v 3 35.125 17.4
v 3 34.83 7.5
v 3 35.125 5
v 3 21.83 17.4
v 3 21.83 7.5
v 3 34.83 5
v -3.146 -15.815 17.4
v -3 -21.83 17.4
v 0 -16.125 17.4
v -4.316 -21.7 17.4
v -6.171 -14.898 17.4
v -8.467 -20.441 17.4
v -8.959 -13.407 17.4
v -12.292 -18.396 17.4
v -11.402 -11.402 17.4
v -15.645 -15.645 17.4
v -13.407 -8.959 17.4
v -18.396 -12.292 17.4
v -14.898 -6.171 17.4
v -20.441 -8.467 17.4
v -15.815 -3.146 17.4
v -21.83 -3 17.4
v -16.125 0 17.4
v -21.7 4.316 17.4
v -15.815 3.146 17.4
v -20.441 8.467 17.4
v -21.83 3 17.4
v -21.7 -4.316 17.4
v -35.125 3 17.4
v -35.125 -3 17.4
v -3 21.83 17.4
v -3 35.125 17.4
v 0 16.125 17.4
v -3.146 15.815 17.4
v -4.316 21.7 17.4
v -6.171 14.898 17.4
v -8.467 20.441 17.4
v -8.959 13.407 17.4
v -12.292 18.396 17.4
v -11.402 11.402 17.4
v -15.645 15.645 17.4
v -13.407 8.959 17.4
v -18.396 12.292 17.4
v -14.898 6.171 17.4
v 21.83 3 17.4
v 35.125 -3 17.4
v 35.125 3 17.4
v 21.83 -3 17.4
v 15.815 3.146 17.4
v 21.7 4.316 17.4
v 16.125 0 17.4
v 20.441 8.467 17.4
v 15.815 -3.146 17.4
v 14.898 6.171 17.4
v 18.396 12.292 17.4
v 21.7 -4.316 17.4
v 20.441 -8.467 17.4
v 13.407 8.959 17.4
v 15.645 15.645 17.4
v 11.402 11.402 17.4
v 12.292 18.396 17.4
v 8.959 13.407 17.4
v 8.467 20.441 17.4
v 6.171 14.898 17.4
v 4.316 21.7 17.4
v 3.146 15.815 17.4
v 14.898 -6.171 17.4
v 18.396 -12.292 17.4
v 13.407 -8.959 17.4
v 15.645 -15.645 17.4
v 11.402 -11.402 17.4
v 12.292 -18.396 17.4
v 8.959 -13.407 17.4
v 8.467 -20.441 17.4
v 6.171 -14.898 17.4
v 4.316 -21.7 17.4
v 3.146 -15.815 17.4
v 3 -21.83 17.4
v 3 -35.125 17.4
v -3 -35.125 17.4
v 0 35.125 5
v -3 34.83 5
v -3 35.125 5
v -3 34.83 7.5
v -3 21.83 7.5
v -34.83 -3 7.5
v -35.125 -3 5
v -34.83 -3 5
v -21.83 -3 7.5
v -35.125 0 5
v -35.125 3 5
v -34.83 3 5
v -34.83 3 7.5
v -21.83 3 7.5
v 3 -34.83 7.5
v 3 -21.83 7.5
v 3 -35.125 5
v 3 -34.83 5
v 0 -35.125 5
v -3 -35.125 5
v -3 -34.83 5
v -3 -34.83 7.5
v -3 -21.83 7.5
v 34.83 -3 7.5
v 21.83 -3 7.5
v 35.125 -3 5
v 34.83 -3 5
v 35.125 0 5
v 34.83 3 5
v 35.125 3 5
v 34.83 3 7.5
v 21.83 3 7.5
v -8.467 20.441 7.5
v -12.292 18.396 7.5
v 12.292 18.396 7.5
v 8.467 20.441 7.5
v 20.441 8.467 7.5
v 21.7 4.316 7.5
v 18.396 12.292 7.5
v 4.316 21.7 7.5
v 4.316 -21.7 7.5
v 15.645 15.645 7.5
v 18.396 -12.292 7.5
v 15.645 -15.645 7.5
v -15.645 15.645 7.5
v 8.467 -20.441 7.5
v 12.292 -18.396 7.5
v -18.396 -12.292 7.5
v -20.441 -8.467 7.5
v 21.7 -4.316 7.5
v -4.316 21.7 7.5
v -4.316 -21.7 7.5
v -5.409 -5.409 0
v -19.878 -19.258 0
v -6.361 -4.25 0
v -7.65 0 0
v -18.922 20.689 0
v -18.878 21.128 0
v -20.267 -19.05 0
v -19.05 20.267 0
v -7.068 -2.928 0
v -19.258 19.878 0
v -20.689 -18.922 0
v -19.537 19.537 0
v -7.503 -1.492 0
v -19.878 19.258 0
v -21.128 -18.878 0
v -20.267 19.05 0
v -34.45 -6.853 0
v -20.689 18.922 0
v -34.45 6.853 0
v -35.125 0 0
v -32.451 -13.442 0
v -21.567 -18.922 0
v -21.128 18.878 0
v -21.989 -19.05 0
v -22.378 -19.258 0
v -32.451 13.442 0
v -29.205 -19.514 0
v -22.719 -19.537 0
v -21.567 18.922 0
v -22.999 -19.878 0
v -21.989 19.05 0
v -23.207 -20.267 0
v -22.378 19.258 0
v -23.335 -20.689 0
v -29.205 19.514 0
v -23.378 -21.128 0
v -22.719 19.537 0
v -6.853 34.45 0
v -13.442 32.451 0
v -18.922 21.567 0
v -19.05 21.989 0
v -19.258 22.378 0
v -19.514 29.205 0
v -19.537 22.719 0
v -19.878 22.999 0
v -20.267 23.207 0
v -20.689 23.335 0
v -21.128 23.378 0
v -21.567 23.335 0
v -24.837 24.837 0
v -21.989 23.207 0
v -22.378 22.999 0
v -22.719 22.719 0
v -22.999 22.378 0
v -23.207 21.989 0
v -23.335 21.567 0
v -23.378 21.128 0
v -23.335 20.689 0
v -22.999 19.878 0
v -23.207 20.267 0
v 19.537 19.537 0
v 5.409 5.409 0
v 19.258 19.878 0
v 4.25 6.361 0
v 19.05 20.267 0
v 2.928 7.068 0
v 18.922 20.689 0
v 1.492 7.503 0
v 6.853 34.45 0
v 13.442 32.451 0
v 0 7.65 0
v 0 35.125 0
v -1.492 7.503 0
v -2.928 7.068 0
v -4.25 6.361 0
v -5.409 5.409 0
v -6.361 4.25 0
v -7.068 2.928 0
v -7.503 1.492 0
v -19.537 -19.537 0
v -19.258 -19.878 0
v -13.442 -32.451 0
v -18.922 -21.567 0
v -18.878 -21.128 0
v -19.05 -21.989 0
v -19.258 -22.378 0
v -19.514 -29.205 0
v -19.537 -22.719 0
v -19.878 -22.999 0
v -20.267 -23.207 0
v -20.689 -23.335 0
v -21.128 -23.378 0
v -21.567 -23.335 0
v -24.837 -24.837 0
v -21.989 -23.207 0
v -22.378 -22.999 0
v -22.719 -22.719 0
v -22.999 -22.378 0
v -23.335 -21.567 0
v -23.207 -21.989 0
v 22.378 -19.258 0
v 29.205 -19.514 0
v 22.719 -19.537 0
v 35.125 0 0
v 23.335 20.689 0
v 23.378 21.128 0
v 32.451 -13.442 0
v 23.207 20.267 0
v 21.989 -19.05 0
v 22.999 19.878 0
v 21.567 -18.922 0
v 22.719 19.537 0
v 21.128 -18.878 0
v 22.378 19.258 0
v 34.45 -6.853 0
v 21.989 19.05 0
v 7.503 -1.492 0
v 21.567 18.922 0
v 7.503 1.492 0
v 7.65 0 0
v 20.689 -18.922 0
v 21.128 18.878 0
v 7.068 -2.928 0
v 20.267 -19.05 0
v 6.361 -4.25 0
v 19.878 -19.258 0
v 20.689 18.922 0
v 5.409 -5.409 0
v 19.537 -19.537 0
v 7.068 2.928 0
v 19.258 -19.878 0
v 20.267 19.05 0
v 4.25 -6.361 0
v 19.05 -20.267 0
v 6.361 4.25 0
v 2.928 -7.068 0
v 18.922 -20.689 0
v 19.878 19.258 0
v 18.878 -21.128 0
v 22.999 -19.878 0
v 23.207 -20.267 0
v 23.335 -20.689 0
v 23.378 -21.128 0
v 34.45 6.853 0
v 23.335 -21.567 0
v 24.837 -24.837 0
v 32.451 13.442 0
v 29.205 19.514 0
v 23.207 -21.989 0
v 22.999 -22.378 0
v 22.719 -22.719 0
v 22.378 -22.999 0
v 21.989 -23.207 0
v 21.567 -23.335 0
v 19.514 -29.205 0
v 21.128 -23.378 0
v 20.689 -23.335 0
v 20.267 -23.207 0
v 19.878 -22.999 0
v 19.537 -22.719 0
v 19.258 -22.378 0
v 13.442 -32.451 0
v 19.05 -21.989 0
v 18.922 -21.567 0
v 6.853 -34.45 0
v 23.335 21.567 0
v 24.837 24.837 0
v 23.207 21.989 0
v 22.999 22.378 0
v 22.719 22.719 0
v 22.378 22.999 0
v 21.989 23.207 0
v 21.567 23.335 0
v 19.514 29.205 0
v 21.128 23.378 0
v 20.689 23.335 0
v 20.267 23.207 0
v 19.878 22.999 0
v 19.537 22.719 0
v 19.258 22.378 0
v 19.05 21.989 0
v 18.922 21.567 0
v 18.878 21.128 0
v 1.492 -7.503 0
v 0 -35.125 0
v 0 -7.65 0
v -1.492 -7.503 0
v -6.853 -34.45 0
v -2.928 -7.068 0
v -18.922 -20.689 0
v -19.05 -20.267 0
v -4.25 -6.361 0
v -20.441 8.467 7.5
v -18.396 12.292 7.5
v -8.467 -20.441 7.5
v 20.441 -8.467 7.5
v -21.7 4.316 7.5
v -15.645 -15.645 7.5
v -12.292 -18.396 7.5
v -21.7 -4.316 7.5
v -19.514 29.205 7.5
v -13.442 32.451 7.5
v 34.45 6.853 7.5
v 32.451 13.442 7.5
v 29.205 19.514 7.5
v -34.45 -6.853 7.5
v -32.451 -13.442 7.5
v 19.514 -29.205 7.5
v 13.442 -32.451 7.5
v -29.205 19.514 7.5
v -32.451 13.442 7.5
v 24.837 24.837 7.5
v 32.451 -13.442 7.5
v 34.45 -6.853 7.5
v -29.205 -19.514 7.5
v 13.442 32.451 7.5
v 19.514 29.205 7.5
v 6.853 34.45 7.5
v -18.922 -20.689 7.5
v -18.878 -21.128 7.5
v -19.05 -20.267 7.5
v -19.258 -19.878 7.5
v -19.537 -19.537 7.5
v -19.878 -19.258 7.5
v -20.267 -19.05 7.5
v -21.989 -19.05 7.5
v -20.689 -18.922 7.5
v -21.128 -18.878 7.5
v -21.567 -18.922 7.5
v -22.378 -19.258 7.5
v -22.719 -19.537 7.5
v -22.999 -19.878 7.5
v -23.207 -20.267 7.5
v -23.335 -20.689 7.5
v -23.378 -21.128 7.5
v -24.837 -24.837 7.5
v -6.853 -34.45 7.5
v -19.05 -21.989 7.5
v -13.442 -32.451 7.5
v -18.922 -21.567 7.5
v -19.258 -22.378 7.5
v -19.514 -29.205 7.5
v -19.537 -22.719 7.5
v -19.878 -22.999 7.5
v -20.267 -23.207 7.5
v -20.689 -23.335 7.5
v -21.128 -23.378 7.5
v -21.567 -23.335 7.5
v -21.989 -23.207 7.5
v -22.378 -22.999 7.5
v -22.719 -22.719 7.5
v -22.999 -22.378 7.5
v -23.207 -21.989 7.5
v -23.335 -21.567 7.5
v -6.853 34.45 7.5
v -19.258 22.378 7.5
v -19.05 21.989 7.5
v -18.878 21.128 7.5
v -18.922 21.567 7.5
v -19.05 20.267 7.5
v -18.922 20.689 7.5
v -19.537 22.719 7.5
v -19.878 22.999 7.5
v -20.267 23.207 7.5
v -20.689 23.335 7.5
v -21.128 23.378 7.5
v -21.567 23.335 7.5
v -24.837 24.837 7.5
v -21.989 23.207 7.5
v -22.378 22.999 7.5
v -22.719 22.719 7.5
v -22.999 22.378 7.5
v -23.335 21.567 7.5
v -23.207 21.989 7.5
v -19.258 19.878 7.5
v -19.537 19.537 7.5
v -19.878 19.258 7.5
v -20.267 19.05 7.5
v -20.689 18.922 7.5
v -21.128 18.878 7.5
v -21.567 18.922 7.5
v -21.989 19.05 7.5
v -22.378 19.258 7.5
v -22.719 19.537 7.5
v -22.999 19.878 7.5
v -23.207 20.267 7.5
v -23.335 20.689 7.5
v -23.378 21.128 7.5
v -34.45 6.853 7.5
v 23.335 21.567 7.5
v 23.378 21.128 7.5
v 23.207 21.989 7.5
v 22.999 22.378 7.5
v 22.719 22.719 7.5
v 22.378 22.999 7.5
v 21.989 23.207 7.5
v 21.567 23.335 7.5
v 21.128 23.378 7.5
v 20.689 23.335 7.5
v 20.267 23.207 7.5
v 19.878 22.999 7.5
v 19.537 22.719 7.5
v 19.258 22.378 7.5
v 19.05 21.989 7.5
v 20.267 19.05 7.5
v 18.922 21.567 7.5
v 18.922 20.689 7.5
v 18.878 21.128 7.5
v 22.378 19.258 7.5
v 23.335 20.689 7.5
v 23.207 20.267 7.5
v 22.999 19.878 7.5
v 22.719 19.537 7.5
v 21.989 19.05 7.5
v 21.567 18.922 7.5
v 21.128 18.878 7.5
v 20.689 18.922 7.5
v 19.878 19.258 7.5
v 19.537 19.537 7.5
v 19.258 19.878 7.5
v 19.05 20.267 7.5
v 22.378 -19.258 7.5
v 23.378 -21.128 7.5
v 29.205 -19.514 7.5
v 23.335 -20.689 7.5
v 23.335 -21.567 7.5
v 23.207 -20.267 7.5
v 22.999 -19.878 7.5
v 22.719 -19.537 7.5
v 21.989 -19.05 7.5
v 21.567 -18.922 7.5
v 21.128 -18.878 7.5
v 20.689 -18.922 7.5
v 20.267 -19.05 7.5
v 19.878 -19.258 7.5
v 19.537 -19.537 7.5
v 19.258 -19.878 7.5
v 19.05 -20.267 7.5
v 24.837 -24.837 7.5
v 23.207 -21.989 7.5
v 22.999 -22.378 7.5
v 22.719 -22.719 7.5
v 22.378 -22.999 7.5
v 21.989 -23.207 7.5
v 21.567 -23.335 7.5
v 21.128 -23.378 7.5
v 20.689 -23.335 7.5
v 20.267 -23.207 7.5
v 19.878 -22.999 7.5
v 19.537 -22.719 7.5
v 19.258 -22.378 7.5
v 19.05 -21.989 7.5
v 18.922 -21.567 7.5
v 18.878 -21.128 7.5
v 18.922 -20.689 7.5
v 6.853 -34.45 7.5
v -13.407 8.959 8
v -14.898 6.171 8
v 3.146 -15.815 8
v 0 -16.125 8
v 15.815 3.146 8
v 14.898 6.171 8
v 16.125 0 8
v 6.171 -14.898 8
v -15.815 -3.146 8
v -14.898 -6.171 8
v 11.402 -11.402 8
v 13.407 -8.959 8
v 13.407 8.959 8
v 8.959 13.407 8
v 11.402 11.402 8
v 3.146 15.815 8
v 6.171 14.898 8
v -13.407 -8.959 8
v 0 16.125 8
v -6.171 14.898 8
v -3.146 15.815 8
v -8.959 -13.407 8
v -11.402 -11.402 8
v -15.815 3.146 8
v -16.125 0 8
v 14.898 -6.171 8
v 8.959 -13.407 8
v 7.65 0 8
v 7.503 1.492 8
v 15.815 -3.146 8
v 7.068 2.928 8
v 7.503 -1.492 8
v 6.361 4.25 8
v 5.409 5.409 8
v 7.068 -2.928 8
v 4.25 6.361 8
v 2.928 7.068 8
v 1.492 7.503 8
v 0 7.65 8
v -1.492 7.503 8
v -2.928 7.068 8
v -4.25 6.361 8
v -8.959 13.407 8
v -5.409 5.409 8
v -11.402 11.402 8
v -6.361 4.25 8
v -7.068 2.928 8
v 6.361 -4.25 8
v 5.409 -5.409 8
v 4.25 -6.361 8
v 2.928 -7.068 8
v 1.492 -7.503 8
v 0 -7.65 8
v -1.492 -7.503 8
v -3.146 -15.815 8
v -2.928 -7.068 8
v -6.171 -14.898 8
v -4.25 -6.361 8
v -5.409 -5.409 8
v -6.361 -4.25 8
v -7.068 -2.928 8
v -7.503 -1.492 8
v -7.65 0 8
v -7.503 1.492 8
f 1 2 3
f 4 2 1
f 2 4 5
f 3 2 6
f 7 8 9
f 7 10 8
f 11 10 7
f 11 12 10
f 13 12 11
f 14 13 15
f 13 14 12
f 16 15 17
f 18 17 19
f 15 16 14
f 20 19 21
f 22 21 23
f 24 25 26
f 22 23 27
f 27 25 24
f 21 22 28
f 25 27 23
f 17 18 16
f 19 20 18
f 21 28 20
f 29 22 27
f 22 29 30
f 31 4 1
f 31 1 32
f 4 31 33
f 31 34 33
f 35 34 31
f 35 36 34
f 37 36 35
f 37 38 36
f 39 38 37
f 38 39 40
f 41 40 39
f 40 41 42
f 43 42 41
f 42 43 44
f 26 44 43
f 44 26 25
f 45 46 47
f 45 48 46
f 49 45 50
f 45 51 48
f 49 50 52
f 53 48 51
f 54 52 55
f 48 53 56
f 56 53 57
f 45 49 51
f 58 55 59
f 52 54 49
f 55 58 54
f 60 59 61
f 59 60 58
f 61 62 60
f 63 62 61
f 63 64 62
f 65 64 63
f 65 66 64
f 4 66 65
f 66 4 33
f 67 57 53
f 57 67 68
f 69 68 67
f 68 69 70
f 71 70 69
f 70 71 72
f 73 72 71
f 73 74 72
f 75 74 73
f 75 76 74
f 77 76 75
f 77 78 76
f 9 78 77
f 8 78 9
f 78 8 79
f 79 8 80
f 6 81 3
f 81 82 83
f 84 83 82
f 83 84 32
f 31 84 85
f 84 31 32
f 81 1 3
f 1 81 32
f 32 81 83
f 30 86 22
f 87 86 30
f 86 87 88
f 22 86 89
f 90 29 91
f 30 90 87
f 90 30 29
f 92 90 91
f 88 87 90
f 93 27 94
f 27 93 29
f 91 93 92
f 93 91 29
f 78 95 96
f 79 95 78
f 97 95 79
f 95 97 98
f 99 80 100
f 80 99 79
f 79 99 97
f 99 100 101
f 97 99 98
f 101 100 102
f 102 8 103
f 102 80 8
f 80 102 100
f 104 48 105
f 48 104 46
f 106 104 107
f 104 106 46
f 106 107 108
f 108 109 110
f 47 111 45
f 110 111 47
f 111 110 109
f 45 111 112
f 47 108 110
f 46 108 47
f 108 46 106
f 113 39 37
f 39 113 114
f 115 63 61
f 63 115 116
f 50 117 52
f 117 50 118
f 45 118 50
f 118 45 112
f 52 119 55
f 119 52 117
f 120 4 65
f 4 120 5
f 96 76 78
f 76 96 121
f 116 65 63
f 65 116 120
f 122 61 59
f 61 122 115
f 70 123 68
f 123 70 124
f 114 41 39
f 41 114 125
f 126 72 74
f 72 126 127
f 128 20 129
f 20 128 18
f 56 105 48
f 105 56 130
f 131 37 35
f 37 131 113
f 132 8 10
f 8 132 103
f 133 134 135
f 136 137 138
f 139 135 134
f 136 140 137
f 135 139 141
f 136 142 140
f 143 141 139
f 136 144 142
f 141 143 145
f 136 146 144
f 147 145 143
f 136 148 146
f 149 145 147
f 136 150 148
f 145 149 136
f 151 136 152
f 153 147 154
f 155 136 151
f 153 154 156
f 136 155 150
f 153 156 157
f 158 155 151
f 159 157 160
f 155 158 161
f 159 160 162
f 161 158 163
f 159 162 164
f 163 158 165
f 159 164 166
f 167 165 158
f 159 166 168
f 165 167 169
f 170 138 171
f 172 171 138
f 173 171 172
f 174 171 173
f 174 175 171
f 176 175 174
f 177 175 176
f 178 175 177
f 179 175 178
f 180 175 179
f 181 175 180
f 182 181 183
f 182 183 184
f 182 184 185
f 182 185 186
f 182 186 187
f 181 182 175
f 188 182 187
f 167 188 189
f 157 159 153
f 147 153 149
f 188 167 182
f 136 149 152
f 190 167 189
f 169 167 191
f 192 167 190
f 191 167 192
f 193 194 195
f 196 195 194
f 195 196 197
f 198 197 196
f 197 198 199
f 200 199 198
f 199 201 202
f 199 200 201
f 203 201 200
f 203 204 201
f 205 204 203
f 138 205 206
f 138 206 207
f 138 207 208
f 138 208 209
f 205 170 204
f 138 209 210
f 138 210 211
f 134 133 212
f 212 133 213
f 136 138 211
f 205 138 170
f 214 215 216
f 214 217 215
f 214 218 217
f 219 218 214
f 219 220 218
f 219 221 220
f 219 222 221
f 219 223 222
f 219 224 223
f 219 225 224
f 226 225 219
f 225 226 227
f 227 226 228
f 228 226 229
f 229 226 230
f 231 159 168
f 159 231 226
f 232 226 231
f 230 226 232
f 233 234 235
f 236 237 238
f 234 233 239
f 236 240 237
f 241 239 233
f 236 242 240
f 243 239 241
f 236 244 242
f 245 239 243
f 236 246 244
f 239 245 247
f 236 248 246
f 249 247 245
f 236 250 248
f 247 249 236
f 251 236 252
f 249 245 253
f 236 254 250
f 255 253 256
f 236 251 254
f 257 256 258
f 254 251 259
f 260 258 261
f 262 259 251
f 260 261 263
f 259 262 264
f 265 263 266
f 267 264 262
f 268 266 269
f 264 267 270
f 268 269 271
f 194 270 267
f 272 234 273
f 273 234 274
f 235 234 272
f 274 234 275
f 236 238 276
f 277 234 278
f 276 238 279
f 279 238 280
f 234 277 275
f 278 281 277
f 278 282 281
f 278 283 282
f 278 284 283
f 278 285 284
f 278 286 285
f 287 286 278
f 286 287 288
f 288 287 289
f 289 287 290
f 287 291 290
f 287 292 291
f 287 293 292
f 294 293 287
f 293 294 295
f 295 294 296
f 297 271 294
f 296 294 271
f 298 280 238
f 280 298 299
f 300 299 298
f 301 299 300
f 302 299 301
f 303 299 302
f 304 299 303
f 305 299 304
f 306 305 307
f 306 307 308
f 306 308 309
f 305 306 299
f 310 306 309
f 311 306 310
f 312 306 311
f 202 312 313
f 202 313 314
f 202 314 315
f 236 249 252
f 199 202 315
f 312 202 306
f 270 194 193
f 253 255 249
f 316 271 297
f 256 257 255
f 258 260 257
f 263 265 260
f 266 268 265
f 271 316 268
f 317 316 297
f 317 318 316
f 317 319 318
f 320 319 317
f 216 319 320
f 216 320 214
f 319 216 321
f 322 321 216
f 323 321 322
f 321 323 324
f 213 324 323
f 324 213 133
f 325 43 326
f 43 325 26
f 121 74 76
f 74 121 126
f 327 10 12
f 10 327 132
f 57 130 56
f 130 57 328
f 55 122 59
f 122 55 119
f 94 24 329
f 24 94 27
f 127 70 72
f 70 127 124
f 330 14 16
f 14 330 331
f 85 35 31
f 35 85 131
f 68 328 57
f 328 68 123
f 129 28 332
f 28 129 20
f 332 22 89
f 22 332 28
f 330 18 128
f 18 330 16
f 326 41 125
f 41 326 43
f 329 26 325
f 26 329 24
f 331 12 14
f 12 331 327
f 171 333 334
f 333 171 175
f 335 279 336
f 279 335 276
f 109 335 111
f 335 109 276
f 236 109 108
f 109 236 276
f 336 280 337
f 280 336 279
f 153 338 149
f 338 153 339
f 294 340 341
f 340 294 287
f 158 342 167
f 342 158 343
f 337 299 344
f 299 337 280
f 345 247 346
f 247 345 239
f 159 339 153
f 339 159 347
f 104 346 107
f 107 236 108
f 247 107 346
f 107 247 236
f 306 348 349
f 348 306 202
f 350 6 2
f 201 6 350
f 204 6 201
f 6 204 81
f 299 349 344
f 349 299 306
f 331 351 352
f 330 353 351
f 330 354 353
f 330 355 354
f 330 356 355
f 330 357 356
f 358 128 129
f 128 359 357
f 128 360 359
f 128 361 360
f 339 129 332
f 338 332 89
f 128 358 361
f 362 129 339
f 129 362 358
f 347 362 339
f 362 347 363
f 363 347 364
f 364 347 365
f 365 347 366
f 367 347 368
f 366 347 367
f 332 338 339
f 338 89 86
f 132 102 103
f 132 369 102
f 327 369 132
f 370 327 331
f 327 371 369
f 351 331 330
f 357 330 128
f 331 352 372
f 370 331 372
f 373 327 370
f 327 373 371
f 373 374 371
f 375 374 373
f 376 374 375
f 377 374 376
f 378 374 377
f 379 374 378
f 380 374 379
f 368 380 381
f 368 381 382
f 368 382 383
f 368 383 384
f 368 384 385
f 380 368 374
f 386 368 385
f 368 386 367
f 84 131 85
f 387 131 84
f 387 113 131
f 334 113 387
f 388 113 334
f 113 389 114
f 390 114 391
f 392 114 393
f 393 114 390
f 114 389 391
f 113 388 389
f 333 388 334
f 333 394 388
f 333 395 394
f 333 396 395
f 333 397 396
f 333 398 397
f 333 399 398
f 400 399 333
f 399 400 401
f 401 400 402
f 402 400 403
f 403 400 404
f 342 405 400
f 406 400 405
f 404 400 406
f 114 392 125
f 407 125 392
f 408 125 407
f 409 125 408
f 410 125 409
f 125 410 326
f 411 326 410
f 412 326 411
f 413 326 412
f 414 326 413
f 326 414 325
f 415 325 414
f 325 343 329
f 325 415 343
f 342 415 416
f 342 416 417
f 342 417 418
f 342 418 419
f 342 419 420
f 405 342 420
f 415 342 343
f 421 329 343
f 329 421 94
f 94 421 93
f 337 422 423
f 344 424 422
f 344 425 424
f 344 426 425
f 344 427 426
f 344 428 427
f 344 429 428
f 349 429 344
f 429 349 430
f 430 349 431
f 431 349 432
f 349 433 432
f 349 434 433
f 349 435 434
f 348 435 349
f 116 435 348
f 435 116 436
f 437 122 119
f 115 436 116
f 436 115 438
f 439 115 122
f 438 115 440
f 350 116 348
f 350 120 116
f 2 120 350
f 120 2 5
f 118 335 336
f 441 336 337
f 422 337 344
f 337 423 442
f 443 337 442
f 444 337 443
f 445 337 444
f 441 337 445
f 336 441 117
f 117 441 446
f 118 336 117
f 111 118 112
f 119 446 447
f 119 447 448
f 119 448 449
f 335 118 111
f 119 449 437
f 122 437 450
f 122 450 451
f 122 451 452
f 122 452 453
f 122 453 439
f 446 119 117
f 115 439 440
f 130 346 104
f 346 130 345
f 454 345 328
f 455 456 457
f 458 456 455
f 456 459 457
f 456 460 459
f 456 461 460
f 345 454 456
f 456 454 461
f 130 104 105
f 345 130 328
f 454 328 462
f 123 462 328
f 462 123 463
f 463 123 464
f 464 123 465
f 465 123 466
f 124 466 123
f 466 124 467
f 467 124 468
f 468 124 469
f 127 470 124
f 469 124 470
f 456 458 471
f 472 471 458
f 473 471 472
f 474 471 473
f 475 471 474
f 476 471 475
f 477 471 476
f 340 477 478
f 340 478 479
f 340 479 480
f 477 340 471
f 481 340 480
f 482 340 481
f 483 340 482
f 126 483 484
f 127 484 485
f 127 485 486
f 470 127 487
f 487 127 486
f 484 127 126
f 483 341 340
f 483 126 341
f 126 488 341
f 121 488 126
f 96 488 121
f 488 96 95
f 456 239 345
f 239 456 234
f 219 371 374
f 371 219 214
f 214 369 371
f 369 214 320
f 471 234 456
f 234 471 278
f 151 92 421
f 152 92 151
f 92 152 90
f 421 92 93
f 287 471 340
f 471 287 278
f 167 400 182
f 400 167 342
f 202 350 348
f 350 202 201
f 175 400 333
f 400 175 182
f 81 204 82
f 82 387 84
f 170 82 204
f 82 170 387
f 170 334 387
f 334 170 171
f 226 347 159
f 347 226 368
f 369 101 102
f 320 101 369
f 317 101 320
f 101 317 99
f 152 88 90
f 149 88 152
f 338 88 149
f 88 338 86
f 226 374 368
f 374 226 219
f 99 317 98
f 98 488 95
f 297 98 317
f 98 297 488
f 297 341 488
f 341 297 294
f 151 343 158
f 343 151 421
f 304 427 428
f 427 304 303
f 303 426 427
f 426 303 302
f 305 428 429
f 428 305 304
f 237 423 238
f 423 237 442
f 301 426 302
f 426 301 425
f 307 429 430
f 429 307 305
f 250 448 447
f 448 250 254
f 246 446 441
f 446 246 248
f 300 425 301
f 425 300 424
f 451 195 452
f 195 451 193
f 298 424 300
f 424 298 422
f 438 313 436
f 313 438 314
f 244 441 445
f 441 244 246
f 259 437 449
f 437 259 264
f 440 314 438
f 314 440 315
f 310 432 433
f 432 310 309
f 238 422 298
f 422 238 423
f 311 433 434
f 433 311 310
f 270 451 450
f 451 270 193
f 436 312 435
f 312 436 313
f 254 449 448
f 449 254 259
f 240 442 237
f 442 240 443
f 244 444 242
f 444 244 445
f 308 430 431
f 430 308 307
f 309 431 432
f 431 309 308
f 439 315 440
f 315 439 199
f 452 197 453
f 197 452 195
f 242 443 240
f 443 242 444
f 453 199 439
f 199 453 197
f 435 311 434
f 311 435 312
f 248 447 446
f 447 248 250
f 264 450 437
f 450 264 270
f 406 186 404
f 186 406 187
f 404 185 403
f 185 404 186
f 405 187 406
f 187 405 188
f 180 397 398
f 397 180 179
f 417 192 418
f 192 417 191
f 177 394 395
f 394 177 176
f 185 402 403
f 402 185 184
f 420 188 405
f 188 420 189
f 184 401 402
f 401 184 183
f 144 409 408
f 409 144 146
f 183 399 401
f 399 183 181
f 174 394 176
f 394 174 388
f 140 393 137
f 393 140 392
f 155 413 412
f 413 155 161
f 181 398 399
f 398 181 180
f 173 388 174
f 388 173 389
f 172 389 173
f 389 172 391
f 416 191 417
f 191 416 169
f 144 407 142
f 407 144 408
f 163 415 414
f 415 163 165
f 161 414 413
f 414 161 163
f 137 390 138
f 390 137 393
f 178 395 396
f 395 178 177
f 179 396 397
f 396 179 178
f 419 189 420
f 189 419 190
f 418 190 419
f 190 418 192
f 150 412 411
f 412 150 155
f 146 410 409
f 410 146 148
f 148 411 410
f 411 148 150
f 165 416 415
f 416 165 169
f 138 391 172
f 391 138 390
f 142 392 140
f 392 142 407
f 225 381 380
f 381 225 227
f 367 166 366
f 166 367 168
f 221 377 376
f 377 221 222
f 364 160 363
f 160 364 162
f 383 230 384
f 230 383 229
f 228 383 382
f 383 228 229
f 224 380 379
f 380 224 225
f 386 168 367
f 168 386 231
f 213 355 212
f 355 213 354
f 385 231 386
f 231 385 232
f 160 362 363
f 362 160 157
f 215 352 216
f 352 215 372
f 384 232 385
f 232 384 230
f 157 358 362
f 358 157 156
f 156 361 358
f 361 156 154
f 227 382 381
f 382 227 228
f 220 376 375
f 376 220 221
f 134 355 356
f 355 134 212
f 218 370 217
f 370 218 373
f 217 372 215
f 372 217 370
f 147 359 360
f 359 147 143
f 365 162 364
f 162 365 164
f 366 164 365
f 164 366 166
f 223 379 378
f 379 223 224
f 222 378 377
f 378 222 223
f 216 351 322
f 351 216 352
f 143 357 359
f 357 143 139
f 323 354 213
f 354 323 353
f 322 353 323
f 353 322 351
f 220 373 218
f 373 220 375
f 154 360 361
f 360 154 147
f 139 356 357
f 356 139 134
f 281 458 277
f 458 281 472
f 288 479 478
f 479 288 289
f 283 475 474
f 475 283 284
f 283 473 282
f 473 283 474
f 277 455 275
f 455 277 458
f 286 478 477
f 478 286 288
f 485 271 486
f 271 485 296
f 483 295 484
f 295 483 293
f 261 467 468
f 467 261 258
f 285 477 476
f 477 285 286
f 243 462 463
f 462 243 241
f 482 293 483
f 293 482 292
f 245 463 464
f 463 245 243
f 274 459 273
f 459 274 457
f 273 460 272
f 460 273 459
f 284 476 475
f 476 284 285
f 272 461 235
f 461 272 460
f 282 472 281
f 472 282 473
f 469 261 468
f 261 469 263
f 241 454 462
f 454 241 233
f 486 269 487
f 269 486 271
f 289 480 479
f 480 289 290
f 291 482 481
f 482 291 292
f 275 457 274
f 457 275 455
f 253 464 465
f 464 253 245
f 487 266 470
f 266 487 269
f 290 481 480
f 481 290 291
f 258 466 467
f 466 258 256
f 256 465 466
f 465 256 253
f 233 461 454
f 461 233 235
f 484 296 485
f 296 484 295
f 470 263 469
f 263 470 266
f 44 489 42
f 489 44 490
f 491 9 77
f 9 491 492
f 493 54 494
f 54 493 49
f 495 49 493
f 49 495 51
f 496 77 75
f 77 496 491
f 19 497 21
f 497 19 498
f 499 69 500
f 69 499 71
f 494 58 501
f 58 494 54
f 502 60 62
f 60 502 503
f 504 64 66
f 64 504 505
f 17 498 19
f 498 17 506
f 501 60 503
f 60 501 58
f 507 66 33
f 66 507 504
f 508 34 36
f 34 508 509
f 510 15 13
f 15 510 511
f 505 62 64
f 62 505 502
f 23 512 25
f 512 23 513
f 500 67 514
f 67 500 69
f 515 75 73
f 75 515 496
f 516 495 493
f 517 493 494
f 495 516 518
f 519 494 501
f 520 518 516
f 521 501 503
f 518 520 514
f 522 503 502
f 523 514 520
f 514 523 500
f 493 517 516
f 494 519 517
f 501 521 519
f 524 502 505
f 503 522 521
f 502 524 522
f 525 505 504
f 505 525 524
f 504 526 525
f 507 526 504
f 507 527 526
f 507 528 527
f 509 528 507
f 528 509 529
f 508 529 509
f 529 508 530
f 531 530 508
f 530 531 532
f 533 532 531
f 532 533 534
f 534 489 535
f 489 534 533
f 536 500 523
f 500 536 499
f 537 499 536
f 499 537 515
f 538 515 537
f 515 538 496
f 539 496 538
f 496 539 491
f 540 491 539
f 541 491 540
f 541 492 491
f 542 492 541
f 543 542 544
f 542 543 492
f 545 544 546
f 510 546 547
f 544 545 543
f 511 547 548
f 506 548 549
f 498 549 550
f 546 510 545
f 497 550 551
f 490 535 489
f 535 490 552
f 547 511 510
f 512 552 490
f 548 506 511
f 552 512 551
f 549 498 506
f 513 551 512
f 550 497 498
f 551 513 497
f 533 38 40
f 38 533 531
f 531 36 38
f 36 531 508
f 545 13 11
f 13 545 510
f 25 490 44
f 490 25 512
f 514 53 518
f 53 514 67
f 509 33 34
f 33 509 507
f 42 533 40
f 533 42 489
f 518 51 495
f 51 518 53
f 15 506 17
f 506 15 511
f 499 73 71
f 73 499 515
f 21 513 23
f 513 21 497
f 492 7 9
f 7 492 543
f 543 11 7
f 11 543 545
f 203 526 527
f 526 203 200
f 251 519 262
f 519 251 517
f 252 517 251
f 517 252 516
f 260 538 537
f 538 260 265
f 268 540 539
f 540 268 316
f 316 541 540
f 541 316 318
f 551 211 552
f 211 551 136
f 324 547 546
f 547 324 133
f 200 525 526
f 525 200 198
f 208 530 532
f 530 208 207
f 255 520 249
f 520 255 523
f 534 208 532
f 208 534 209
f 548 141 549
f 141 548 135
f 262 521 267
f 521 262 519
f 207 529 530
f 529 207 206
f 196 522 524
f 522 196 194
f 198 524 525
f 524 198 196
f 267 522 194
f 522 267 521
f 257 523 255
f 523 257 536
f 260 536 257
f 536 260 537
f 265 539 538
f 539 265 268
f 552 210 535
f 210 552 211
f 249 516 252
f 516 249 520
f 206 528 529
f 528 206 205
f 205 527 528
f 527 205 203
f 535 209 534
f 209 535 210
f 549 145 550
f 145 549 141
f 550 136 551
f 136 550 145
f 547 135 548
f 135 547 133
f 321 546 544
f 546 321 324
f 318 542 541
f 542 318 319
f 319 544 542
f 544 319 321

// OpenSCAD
$fn = 32;

// ----------------------------------------------------------------------
// Bearing housing: seat for 6002 (32 x 9 mm), 44.25 mm body
// ----------------------------------------------------------------------

// --- parameters (mm) ---
housing_d = 44.25;        // housing outside diameter
housing_h = 17.4;         // overall housing height
wall_t = 6;               // wall thickness
seat_d = 32.25;           // 6002 seat, 0.25 mm clearance
seat_h = 9.4;             // pocket depth
shoulder = 2;             // shoulder under the bearing
pass_d = 15.3;            // shaft passage
flange_d = 70.25;         // mounting flange diameter
flange_t = 6;             // flange thickness
bolt_d = 4.5;             // flange bolt clearance
bolt_r = 29.88;           // flange bolt circle radius
rib_w = 6;                // rib width
rib_n = 4;                // rib count

module body() {
  cylinder(h = housing_h, d = housing_d);
}

module flange() {
  /* flange sunk 1.5 mm into the body */
  cylinder(h = flange_t + 1.5, d = flange_d);
}

module ribs() {
  for (i = [0 : rib_n - 1])
    rotate([0, 0, i * 360 / rib_n])
      translate([-rib_w / 2, housing_d / 2 - 0.8, flange_t - 1])
        cube([rib_w, (flange_d - housing_d) / 2 + 0.8, housing_h - flange_t + 1]);
}

difference() {
  union() {
    body();
    flange();
    ribs();
  }
  translate([0, 0, housing_h - seat_h]) cylinder(h = seat_h + 1, d = seat_d);
  translate([0, 0, -1]) cylinder(h = housing_h - seat_h + 1, d = pass_d);
  for (i = [0 : 3]) rotate([0, 0, 45 + i * 90]) translate([bolt_r, 0, -1])
    cylinder(h = flange_t + 3, d = bolt_d);
}
